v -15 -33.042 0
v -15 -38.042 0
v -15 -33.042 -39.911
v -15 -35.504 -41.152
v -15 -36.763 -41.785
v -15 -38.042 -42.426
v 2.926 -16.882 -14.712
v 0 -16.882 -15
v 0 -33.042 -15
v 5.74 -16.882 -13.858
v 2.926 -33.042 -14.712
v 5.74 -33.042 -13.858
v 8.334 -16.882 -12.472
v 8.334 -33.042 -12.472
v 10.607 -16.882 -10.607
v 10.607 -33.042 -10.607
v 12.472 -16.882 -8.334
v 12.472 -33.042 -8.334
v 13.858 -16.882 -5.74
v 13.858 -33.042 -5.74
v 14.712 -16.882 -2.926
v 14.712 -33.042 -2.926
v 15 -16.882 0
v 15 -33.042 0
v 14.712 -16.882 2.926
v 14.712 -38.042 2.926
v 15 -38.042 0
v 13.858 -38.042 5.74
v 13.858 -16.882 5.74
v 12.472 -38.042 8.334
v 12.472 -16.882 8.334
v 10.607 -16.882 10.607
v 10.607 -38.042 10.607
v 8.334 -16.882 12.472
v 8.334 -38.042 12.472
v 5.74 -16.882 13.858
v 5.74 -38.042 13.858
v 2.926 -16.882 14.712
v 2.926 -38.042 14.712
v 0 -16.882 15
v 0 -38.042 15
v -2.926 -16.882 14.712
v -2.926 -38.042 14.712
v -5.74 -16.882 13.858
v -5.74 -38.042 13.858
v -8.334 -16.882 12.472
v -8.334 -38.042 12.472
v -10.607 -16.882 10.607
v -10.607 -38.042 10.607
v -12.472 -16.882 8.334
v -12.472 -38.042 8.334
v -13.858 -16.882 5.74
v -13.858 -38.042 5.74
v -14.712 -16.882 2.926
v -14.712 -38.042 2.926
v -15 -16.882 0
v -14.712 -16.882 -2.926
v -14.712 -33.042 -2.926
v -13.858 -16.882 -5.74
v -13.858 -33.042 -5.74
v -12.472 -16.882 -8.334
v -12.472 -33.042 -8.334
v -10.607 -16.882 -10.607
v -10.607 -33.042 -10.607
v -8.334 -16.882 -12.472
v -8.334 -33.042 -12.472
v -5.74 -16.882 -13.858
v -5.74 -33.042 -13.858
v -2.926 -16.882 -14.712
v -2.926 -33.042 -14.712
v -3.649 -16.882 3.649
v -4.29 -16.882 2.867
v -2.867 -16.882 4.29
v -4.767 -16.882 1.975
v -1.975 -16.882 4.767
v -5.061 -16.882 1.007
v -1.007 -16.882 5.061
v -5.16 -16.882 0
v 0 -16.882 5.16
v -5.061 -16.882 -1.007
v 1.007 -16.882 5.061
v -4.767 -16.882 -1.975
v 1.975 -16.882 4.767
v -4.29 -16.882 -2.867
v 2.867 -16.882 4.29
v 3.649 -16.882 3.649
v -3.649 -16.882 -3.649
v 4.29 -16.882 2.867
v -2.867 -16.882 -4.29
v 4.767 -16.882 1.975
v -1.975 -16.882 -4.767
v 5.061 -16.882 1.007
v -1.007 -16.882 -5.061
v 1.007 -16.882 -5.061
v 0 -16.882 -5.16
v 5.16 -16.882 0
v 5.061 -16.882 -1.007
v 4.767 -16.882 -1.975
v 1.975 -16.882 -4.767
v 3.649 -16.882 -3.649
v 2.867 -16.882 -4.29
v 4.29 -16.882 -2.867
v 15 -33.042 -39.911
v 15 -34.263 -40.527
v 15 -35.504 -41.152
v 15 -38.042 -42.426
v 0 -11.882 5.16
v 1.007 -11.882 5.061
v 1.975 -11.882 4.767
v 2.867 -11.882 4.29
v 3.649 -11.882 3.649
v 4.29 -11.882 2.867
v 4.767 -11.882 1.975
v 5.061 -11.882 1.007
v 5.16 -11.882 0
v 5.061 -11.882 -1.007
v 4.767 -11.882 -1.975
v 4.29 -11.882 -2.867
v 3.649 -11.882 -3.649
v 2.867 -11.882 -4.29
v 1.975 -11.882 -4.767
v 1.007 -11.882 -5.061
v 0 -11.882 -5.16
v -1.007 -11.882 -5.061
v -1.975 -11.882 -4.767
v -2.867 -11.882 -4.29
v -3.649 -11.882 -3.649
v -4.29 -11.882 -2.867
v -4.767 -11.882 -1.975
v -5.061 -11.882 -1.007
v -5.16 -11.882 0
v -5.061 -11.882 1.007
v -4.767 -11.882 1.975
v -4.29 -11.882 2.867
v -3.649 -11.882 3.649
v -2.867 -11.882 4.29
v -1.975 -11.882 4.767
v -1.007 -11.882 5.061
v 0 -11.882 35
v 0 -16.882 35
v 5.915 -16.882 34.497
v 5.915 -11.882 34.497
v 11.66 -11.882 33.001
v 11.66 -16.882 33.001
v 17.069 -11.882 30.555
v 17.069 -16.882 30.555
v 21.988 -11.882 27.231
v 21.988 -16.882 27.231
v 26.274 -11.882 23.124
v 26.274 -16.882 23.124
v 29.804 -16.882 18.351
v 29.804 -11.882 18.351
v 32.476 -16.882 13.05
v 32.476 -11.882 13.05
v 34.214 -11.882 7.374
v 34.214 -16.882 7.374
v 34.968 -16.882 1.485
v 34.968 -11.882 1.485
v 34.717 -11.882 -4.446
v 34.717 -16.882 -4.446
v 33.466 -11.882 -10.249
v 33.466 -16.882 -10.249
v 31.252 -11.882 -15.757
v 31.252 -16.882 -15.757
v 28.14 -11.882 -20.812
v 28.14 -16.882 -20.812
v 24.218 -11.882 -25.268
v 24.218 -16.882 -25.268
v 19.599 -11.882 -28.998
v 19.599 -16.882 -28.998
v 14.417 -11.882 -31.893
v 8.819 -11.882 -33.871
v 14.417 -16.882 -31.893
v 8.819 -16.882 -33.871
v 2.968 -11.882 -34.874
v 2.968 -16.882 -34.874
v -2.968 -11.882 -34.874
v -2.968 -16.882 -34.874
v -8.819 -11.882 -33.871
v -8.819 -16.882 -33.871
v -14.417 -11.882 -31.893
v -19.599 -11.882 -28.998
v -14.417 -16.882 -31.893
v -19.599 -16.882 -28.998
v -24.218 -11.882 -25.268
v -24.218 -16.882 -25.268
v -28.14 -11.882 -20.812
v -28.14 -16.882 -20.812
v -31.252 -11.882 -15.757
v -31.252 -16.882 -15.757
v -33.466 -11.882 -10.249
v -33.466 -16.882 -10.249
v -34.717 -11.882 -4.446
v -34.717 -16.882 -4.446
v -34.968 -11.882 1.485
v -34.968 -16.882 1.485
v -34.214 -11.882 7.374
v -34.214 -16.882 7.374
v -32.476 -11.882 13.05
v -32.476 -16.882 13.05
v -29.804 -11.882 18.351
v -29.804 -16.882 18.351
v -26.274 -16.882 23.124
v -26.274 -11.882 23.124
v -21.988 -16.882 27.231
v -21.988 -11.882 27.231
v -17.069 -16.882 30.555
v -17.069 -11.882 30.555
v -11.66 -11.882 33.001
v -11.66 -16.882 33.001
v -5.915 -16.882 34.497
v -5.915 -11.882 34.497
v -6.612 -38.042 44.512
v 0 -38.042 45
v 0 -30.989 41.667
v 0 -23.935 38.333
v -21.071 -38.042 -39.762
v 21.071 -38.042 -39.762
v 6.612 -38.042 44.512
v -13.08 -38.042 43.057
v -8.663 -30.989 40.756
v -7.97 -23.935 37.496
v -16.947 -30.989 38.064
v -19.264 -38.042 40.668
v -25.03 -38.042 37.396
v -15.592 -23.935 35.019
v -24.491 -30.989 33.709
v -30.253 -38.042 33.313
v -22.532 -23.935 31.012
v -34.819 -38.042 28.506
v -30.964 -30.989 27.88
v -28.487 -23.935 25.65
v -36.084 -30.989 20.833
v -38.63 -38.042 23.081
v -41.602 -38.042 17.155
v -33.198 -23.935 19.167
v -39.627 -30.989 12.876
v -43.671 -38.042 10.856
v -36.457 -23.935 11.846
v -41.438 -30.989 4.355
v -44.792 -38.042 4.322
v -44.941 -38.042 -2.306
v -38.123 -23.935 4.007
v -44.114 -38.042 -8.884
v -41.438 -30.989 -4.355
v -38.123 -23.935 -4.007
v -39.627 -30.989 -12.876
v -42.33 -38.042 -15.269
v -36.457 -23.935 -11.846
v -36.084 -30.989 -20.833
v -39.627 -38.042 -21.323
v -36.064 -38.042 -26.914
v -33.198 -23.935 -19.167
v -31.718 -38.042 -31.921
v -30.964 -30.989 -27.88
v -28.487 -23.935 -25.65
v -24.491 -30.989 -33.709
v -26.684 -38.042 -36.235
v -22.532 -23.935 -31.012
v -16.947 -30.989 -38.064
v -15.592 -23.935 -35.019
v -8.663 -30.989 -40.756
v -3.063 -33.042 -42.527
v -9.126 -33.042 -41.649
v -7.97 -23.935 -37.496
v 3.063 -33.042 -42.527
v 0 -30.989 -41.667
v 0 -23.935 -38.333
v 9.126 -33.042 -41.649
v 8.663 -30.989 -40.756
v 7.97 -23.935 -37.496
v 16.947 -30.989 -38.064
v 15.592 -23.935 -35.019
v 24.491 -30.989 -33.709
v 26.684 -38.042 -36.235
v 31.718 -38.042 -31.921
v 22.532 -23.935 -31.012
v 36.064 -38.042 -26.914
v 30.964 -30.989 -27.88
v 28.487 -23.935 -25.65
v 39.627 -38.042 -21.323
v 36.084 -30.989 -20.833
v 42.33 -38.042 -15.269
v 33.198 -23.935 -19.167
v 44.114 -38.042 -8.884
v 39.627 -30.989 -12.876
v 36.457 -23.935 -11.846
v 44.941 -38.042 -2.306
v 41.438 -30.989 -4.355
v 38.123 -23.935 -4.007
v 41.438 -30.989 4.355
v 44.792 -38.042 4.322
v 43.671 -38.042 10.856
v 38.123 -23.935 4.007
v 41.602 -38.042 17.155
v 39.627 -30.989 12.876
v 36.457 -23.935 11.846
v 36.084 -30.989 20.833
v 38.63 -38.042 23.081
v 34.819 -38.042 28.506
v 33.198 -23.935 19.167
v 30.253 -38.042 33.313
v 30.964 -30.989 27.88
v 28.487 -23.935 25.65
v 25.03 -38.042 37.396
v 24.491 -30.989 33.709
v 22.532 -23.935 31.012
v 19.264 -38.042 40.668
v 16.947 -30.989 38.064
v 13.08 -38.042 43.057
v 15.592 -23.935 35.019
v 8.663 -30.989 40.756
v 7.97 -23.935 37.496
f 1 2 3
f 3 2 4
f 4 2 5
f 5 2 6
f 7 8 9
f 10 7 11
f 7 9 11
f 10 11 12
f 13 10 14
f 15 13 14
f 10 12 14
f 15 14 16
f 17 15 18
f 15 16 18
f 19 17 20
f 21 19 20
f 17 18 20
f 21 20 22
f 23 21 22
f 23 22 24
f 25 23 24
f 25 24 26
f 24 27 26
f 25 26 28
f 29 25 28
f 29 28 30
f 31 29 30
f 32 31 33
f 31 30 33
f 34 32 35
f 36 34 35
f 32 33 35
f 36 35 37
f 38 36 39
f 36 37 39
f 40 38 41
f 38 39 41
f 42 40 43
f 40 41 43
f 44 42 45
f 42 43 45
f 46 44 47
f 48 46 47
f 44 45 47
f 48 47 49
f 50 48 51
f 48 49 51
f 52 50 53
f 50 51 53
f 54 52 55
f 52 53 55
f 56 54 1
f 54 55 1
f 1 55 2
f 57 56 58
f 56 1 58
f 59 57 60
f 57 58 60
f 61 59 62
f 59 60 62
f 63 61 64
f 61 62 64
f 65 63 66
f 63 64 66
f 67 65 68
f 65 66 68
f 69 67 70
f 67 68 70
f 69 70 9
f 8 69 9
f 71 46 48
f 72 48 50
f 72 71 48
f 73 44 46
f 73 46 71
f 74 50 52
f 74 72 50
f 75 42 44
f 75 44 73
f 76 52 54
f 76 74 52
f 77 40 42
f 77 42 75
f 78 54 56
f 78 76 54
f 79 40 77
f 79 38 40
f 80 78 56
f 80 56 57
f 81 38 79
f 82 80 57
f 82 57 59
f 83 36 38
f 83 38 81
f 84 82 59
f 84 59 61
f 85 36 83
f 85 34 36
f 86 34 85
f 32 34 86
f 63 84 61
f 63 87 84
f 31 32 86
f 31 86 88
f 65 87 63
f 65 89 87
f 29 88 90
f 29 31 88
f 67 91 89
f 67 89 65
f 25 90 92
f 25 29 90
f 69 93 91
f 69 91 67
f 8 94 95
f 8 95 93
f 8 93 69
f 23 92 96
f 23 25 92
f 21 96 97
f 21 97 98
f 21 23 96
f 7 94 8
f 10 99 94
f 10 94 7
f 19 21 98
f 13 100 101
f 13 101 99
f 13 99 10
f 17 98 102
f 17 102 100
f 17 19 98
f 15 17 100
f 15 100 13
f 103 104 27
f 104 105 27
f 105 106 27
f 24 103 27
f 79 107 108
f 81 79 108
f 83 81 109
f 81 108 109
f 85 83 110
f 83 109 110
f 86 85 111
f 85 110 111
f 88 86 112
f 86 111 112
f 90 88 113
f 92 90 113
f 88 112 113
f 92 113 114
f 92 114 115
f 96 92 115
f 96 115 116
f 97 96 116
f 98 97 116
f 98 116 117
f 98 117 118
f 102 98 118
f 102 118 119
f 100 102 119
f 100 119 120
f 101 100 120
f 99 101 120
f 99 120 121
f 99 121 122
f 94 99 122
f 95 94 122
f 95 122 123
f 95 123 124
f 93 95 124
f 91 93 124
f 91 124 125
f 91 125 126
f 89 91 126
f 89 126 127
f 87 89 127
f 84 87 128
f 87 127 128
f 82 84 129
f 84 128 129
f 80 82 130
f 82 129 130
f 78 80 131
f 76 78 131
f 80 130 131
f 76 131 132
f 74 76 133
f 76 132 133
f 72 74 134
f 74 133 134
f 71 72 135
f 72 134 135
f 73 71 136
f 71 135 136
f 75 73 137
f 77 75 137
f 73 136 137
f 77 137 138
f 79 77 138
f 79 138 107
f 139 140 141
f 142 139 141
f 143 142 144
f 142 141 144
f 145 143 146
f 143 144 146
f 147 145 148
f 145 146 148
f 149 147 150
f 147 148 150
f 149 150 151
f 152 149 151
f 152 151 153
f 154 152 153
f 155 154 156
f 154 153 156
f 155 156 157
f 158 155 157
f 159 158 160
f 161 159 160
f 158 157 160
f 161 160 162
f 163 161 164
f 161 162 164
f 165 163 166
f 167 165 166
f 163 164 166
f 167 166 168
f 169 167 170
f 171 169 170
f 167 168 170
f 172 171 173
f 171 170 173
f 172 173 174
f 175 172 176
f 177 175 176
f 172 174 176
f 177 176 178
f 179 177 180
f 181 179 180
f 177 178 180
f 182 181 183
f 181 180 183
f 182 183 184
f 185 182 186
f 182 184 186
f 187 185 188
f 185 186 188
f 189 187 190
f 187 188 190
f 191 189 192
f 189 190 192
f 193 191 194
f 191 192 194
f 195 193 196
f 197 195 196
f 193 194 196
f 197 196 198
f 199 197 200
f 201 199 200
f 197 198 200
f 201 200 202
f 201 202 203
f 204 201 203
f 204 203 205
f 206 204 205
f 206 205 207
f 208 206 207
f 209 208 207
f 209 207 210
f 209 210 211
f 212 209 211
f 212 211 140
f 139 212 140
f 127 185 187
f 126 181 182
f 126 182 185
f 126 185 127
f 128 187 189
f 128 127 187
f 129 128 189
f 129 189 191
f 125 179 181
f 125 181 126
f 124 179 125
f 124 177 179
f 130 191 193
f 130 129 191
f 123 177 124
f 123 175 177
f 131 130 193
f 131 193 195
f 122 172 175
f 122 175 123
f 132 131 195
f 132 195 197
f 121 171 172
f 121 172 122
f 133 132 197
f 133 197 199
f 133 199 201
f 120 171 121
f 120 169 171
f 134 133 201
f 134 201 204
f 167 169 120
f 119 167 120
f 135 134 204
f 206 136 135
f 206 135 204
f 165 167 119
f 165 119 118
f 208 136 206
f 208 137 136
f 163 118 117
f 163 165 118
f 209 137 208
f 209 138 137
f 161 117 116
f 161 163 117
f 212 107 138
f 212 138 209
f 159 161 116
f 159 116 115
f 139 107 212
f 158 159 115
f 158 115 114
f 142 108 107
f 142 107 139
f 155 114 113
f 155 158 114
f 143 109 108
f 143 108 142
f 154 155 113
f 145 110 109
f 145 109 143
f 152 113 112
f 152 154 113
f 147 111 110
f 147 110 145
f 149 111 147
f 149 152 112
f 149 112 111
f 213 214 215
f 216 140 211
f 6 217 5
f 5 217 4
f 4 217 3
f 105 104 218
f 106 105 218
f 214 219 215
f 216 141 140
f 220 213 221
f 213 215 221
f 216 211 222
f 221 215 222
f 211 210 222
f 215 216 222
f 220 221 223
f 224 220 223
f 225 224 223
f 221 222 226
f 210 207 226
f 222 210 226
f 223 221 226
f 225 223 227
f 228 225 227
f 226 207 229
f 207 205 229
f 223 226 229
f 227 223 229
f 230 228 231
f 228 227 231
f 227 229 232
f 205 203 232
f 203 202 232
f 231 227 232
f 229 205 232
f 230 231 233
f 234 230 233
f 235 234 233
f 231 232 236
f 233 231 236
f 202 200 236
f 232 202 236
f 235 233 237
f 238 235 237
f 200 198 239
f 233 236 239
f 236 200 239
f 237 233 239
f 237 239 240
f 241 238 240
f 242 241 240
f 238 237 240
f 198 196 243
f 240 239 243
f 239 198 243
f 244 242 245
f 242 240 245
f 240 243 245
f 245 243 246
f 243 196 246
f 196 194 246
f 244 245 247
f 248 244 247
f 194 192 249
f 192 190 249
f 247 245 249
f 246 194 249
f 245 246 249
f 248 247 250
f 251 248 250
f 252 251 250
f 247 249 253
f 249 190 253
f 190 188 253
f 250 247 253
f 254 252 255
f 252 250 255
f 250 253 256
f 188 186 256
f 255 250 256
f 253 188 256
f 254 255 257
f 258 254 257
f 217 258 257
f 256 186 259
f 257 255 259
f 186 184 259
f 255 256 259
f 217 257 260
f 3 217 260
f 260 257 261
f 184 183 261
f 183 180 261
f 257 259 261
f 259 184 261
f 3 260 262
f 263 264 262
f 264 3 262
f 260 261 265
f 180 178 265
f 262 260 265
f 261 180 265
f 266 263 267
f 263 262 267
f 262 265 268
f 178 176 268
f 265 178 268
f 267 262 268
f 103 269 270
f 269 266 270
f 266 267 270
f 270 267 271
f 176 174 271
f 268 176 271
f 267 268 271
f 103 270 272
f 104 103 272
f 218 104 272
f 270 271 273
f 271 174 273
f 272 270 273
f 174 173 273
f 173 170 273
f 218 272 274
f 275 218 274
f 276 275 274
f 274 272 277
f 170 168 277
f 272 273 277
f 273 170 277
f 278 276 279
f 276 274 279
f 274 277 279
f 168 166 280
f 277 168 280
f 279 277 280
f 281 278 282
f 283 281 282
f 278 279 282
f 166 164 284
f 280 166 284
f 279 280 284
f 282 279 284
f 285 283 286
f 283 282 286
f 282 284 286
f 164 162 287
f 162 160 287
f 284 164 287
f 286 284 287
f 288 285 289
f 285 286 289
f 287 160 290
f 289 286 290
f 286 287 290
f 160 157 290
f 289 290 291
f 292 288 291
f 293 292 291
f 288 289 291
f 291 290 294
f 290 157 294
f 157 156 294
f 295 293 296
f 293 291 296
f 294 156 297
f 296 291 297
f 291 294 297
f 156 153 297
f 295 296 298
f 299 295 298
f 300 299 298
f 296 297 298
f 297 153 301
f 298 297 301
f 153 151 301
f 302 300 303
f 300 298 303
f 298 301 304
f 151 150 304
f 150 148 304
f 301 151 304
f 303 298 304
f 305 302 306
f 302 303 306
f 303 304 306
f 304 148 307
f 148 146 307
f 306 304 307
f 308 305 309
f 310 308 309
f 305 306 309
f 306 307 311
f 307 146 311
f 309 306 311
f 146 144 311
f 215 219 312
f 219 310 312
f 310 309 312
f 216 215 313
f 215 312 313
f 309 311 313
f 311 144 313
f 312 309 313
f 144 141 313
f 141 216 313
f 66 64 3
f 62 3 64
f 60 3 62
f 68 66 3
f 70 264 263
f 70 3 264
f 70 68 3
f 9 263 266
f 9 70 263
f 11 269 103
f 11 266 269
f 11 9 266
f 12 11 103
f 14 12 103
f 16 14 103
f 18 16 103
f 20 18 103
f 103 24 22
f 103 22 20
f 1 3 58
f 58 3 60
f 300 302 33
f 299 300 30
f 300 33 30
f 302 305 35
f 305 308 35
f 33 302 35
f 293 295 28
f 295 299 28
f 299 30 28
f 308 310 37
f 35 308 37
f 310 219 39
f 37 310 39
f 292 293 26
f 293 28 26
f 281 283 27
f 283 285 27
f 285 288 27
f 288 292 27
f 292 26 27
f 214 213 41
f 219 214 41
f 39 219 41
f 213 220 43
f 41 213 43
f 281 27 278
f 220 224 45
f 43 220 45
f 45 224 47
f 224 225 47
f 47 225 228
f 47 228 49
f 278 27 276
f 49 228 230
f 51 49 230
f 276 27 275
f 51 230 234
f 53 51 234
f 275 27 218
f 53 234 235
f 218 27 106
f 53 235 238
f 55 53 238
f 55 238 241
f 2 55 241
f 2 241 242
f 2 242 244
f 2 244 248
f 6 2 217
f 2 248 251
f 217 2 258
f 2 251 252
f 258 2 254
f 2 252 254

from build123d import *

# Parameters (mm, degrees)
CROQUIS3_R              = 35
SALIENTE_EXTRUIR1_DEPTH = 5
CROQUIS4_R              = 5.16
CORTAR_EXTRUIR1_DEPTH   = 69.806581081
CROQUIS5_R              = 15
CORTAR_EXTRUIR2_DEPTH   = 21.16
CORTAR_EXTRUIR4_DEPTH   = 5


with BuildPart() as part:
    # Croquis2 → Revolución1 (revolve)
    with BuildSketch(Plane.XY, mode=Mode.PRIVATE) as revoluci_n1_sk:
        Polygon((0, -38.041888008), (-45, -38.041888008), (-35, -16.881888008), (0, -16.881888008), align=None)
    revolve(revoluci_n1_sk.sketch.rotate(Axis((0, 0, 0), (0, -1, 0)), 270), axis=Axis((0, 0, 0), (0, -1, 0)))

    # Croquis3 → Saliente-Extruir1 (add)
    with BuildSketch(Plane(origin=(0, -16.881888008, 0), x_dir=(1, 0, 0), z_dir=(0, 1, 0))):
        with Locations(Location((0, 0, 0), (0, 0, 270))):
            Circle(CROQUIS3_R)
    extrude(amount=SALIENTE_EXTRUIR1_DEPTH)

    # Croquis4 → Cortar-Extruir1 (cut, through all)
    with BuildSketch(Plane(origin=(0, -11.881888008, 0), x_dir=(1, 0, 0), z_dir=(0, 1, 0))):
        with Locations(Location((0, 0, 0), (0, 0, 270))):
            Circle(CROQUIS4_R)
    extrude(amount=-CORTAR_EXTRUIR1_DEPTH, mode=Mode.SUBTRACT)

    # Croquis5 → Cortar-Extruir2 (cut)
    with BuildSketch(Plane.XZ.offset(38.041888008)):
        with Locations(Location((0, 0, 0), (0, 0, 270))):
            Circle(CROQUIS5_R)
    extrude(amount=-CORTAR_EXTRUIR2_DEPTH, mode=Mode.SUBTRACT)

    # Croquis6 → Cortar-Extruir4 (cut)
    with BuildSketch(Plane.XZ.offset(38.041888008)):
        with BuildLine():
            Line((15, 0), (-15, 0))
            Line((-15, 0), (-15, -42.426406871))
            add(Edge.make_bspline(
                [(-15, -42.426406871), (-10.19808837, -44.127599643), (-0.005080405, -45.873007121), (10.203817441, -44.12638642), (15, -42.426406871)],
                knots=[0, 0, 0, 0, 0.500054305, 1, 1, 1, 1], degree=3))
            Line((15, -42.426406871), (15, 0))
        make_face()
    extrude(amount=-CORTAR_EXTRUIR4_DEPTH, mode=Mode.SUBTRACT)


with BuildPart() as cortar_extruir4_kept_piece:
    # of the separate pieces the step leaves, the one the design keeps (cortar_extruir4_pieces_kept)
    add(part.part.solids().sort_by_distance((0, -38.041888008, 45))[0])


solid = cortar_extruir4_kept_piece.part
